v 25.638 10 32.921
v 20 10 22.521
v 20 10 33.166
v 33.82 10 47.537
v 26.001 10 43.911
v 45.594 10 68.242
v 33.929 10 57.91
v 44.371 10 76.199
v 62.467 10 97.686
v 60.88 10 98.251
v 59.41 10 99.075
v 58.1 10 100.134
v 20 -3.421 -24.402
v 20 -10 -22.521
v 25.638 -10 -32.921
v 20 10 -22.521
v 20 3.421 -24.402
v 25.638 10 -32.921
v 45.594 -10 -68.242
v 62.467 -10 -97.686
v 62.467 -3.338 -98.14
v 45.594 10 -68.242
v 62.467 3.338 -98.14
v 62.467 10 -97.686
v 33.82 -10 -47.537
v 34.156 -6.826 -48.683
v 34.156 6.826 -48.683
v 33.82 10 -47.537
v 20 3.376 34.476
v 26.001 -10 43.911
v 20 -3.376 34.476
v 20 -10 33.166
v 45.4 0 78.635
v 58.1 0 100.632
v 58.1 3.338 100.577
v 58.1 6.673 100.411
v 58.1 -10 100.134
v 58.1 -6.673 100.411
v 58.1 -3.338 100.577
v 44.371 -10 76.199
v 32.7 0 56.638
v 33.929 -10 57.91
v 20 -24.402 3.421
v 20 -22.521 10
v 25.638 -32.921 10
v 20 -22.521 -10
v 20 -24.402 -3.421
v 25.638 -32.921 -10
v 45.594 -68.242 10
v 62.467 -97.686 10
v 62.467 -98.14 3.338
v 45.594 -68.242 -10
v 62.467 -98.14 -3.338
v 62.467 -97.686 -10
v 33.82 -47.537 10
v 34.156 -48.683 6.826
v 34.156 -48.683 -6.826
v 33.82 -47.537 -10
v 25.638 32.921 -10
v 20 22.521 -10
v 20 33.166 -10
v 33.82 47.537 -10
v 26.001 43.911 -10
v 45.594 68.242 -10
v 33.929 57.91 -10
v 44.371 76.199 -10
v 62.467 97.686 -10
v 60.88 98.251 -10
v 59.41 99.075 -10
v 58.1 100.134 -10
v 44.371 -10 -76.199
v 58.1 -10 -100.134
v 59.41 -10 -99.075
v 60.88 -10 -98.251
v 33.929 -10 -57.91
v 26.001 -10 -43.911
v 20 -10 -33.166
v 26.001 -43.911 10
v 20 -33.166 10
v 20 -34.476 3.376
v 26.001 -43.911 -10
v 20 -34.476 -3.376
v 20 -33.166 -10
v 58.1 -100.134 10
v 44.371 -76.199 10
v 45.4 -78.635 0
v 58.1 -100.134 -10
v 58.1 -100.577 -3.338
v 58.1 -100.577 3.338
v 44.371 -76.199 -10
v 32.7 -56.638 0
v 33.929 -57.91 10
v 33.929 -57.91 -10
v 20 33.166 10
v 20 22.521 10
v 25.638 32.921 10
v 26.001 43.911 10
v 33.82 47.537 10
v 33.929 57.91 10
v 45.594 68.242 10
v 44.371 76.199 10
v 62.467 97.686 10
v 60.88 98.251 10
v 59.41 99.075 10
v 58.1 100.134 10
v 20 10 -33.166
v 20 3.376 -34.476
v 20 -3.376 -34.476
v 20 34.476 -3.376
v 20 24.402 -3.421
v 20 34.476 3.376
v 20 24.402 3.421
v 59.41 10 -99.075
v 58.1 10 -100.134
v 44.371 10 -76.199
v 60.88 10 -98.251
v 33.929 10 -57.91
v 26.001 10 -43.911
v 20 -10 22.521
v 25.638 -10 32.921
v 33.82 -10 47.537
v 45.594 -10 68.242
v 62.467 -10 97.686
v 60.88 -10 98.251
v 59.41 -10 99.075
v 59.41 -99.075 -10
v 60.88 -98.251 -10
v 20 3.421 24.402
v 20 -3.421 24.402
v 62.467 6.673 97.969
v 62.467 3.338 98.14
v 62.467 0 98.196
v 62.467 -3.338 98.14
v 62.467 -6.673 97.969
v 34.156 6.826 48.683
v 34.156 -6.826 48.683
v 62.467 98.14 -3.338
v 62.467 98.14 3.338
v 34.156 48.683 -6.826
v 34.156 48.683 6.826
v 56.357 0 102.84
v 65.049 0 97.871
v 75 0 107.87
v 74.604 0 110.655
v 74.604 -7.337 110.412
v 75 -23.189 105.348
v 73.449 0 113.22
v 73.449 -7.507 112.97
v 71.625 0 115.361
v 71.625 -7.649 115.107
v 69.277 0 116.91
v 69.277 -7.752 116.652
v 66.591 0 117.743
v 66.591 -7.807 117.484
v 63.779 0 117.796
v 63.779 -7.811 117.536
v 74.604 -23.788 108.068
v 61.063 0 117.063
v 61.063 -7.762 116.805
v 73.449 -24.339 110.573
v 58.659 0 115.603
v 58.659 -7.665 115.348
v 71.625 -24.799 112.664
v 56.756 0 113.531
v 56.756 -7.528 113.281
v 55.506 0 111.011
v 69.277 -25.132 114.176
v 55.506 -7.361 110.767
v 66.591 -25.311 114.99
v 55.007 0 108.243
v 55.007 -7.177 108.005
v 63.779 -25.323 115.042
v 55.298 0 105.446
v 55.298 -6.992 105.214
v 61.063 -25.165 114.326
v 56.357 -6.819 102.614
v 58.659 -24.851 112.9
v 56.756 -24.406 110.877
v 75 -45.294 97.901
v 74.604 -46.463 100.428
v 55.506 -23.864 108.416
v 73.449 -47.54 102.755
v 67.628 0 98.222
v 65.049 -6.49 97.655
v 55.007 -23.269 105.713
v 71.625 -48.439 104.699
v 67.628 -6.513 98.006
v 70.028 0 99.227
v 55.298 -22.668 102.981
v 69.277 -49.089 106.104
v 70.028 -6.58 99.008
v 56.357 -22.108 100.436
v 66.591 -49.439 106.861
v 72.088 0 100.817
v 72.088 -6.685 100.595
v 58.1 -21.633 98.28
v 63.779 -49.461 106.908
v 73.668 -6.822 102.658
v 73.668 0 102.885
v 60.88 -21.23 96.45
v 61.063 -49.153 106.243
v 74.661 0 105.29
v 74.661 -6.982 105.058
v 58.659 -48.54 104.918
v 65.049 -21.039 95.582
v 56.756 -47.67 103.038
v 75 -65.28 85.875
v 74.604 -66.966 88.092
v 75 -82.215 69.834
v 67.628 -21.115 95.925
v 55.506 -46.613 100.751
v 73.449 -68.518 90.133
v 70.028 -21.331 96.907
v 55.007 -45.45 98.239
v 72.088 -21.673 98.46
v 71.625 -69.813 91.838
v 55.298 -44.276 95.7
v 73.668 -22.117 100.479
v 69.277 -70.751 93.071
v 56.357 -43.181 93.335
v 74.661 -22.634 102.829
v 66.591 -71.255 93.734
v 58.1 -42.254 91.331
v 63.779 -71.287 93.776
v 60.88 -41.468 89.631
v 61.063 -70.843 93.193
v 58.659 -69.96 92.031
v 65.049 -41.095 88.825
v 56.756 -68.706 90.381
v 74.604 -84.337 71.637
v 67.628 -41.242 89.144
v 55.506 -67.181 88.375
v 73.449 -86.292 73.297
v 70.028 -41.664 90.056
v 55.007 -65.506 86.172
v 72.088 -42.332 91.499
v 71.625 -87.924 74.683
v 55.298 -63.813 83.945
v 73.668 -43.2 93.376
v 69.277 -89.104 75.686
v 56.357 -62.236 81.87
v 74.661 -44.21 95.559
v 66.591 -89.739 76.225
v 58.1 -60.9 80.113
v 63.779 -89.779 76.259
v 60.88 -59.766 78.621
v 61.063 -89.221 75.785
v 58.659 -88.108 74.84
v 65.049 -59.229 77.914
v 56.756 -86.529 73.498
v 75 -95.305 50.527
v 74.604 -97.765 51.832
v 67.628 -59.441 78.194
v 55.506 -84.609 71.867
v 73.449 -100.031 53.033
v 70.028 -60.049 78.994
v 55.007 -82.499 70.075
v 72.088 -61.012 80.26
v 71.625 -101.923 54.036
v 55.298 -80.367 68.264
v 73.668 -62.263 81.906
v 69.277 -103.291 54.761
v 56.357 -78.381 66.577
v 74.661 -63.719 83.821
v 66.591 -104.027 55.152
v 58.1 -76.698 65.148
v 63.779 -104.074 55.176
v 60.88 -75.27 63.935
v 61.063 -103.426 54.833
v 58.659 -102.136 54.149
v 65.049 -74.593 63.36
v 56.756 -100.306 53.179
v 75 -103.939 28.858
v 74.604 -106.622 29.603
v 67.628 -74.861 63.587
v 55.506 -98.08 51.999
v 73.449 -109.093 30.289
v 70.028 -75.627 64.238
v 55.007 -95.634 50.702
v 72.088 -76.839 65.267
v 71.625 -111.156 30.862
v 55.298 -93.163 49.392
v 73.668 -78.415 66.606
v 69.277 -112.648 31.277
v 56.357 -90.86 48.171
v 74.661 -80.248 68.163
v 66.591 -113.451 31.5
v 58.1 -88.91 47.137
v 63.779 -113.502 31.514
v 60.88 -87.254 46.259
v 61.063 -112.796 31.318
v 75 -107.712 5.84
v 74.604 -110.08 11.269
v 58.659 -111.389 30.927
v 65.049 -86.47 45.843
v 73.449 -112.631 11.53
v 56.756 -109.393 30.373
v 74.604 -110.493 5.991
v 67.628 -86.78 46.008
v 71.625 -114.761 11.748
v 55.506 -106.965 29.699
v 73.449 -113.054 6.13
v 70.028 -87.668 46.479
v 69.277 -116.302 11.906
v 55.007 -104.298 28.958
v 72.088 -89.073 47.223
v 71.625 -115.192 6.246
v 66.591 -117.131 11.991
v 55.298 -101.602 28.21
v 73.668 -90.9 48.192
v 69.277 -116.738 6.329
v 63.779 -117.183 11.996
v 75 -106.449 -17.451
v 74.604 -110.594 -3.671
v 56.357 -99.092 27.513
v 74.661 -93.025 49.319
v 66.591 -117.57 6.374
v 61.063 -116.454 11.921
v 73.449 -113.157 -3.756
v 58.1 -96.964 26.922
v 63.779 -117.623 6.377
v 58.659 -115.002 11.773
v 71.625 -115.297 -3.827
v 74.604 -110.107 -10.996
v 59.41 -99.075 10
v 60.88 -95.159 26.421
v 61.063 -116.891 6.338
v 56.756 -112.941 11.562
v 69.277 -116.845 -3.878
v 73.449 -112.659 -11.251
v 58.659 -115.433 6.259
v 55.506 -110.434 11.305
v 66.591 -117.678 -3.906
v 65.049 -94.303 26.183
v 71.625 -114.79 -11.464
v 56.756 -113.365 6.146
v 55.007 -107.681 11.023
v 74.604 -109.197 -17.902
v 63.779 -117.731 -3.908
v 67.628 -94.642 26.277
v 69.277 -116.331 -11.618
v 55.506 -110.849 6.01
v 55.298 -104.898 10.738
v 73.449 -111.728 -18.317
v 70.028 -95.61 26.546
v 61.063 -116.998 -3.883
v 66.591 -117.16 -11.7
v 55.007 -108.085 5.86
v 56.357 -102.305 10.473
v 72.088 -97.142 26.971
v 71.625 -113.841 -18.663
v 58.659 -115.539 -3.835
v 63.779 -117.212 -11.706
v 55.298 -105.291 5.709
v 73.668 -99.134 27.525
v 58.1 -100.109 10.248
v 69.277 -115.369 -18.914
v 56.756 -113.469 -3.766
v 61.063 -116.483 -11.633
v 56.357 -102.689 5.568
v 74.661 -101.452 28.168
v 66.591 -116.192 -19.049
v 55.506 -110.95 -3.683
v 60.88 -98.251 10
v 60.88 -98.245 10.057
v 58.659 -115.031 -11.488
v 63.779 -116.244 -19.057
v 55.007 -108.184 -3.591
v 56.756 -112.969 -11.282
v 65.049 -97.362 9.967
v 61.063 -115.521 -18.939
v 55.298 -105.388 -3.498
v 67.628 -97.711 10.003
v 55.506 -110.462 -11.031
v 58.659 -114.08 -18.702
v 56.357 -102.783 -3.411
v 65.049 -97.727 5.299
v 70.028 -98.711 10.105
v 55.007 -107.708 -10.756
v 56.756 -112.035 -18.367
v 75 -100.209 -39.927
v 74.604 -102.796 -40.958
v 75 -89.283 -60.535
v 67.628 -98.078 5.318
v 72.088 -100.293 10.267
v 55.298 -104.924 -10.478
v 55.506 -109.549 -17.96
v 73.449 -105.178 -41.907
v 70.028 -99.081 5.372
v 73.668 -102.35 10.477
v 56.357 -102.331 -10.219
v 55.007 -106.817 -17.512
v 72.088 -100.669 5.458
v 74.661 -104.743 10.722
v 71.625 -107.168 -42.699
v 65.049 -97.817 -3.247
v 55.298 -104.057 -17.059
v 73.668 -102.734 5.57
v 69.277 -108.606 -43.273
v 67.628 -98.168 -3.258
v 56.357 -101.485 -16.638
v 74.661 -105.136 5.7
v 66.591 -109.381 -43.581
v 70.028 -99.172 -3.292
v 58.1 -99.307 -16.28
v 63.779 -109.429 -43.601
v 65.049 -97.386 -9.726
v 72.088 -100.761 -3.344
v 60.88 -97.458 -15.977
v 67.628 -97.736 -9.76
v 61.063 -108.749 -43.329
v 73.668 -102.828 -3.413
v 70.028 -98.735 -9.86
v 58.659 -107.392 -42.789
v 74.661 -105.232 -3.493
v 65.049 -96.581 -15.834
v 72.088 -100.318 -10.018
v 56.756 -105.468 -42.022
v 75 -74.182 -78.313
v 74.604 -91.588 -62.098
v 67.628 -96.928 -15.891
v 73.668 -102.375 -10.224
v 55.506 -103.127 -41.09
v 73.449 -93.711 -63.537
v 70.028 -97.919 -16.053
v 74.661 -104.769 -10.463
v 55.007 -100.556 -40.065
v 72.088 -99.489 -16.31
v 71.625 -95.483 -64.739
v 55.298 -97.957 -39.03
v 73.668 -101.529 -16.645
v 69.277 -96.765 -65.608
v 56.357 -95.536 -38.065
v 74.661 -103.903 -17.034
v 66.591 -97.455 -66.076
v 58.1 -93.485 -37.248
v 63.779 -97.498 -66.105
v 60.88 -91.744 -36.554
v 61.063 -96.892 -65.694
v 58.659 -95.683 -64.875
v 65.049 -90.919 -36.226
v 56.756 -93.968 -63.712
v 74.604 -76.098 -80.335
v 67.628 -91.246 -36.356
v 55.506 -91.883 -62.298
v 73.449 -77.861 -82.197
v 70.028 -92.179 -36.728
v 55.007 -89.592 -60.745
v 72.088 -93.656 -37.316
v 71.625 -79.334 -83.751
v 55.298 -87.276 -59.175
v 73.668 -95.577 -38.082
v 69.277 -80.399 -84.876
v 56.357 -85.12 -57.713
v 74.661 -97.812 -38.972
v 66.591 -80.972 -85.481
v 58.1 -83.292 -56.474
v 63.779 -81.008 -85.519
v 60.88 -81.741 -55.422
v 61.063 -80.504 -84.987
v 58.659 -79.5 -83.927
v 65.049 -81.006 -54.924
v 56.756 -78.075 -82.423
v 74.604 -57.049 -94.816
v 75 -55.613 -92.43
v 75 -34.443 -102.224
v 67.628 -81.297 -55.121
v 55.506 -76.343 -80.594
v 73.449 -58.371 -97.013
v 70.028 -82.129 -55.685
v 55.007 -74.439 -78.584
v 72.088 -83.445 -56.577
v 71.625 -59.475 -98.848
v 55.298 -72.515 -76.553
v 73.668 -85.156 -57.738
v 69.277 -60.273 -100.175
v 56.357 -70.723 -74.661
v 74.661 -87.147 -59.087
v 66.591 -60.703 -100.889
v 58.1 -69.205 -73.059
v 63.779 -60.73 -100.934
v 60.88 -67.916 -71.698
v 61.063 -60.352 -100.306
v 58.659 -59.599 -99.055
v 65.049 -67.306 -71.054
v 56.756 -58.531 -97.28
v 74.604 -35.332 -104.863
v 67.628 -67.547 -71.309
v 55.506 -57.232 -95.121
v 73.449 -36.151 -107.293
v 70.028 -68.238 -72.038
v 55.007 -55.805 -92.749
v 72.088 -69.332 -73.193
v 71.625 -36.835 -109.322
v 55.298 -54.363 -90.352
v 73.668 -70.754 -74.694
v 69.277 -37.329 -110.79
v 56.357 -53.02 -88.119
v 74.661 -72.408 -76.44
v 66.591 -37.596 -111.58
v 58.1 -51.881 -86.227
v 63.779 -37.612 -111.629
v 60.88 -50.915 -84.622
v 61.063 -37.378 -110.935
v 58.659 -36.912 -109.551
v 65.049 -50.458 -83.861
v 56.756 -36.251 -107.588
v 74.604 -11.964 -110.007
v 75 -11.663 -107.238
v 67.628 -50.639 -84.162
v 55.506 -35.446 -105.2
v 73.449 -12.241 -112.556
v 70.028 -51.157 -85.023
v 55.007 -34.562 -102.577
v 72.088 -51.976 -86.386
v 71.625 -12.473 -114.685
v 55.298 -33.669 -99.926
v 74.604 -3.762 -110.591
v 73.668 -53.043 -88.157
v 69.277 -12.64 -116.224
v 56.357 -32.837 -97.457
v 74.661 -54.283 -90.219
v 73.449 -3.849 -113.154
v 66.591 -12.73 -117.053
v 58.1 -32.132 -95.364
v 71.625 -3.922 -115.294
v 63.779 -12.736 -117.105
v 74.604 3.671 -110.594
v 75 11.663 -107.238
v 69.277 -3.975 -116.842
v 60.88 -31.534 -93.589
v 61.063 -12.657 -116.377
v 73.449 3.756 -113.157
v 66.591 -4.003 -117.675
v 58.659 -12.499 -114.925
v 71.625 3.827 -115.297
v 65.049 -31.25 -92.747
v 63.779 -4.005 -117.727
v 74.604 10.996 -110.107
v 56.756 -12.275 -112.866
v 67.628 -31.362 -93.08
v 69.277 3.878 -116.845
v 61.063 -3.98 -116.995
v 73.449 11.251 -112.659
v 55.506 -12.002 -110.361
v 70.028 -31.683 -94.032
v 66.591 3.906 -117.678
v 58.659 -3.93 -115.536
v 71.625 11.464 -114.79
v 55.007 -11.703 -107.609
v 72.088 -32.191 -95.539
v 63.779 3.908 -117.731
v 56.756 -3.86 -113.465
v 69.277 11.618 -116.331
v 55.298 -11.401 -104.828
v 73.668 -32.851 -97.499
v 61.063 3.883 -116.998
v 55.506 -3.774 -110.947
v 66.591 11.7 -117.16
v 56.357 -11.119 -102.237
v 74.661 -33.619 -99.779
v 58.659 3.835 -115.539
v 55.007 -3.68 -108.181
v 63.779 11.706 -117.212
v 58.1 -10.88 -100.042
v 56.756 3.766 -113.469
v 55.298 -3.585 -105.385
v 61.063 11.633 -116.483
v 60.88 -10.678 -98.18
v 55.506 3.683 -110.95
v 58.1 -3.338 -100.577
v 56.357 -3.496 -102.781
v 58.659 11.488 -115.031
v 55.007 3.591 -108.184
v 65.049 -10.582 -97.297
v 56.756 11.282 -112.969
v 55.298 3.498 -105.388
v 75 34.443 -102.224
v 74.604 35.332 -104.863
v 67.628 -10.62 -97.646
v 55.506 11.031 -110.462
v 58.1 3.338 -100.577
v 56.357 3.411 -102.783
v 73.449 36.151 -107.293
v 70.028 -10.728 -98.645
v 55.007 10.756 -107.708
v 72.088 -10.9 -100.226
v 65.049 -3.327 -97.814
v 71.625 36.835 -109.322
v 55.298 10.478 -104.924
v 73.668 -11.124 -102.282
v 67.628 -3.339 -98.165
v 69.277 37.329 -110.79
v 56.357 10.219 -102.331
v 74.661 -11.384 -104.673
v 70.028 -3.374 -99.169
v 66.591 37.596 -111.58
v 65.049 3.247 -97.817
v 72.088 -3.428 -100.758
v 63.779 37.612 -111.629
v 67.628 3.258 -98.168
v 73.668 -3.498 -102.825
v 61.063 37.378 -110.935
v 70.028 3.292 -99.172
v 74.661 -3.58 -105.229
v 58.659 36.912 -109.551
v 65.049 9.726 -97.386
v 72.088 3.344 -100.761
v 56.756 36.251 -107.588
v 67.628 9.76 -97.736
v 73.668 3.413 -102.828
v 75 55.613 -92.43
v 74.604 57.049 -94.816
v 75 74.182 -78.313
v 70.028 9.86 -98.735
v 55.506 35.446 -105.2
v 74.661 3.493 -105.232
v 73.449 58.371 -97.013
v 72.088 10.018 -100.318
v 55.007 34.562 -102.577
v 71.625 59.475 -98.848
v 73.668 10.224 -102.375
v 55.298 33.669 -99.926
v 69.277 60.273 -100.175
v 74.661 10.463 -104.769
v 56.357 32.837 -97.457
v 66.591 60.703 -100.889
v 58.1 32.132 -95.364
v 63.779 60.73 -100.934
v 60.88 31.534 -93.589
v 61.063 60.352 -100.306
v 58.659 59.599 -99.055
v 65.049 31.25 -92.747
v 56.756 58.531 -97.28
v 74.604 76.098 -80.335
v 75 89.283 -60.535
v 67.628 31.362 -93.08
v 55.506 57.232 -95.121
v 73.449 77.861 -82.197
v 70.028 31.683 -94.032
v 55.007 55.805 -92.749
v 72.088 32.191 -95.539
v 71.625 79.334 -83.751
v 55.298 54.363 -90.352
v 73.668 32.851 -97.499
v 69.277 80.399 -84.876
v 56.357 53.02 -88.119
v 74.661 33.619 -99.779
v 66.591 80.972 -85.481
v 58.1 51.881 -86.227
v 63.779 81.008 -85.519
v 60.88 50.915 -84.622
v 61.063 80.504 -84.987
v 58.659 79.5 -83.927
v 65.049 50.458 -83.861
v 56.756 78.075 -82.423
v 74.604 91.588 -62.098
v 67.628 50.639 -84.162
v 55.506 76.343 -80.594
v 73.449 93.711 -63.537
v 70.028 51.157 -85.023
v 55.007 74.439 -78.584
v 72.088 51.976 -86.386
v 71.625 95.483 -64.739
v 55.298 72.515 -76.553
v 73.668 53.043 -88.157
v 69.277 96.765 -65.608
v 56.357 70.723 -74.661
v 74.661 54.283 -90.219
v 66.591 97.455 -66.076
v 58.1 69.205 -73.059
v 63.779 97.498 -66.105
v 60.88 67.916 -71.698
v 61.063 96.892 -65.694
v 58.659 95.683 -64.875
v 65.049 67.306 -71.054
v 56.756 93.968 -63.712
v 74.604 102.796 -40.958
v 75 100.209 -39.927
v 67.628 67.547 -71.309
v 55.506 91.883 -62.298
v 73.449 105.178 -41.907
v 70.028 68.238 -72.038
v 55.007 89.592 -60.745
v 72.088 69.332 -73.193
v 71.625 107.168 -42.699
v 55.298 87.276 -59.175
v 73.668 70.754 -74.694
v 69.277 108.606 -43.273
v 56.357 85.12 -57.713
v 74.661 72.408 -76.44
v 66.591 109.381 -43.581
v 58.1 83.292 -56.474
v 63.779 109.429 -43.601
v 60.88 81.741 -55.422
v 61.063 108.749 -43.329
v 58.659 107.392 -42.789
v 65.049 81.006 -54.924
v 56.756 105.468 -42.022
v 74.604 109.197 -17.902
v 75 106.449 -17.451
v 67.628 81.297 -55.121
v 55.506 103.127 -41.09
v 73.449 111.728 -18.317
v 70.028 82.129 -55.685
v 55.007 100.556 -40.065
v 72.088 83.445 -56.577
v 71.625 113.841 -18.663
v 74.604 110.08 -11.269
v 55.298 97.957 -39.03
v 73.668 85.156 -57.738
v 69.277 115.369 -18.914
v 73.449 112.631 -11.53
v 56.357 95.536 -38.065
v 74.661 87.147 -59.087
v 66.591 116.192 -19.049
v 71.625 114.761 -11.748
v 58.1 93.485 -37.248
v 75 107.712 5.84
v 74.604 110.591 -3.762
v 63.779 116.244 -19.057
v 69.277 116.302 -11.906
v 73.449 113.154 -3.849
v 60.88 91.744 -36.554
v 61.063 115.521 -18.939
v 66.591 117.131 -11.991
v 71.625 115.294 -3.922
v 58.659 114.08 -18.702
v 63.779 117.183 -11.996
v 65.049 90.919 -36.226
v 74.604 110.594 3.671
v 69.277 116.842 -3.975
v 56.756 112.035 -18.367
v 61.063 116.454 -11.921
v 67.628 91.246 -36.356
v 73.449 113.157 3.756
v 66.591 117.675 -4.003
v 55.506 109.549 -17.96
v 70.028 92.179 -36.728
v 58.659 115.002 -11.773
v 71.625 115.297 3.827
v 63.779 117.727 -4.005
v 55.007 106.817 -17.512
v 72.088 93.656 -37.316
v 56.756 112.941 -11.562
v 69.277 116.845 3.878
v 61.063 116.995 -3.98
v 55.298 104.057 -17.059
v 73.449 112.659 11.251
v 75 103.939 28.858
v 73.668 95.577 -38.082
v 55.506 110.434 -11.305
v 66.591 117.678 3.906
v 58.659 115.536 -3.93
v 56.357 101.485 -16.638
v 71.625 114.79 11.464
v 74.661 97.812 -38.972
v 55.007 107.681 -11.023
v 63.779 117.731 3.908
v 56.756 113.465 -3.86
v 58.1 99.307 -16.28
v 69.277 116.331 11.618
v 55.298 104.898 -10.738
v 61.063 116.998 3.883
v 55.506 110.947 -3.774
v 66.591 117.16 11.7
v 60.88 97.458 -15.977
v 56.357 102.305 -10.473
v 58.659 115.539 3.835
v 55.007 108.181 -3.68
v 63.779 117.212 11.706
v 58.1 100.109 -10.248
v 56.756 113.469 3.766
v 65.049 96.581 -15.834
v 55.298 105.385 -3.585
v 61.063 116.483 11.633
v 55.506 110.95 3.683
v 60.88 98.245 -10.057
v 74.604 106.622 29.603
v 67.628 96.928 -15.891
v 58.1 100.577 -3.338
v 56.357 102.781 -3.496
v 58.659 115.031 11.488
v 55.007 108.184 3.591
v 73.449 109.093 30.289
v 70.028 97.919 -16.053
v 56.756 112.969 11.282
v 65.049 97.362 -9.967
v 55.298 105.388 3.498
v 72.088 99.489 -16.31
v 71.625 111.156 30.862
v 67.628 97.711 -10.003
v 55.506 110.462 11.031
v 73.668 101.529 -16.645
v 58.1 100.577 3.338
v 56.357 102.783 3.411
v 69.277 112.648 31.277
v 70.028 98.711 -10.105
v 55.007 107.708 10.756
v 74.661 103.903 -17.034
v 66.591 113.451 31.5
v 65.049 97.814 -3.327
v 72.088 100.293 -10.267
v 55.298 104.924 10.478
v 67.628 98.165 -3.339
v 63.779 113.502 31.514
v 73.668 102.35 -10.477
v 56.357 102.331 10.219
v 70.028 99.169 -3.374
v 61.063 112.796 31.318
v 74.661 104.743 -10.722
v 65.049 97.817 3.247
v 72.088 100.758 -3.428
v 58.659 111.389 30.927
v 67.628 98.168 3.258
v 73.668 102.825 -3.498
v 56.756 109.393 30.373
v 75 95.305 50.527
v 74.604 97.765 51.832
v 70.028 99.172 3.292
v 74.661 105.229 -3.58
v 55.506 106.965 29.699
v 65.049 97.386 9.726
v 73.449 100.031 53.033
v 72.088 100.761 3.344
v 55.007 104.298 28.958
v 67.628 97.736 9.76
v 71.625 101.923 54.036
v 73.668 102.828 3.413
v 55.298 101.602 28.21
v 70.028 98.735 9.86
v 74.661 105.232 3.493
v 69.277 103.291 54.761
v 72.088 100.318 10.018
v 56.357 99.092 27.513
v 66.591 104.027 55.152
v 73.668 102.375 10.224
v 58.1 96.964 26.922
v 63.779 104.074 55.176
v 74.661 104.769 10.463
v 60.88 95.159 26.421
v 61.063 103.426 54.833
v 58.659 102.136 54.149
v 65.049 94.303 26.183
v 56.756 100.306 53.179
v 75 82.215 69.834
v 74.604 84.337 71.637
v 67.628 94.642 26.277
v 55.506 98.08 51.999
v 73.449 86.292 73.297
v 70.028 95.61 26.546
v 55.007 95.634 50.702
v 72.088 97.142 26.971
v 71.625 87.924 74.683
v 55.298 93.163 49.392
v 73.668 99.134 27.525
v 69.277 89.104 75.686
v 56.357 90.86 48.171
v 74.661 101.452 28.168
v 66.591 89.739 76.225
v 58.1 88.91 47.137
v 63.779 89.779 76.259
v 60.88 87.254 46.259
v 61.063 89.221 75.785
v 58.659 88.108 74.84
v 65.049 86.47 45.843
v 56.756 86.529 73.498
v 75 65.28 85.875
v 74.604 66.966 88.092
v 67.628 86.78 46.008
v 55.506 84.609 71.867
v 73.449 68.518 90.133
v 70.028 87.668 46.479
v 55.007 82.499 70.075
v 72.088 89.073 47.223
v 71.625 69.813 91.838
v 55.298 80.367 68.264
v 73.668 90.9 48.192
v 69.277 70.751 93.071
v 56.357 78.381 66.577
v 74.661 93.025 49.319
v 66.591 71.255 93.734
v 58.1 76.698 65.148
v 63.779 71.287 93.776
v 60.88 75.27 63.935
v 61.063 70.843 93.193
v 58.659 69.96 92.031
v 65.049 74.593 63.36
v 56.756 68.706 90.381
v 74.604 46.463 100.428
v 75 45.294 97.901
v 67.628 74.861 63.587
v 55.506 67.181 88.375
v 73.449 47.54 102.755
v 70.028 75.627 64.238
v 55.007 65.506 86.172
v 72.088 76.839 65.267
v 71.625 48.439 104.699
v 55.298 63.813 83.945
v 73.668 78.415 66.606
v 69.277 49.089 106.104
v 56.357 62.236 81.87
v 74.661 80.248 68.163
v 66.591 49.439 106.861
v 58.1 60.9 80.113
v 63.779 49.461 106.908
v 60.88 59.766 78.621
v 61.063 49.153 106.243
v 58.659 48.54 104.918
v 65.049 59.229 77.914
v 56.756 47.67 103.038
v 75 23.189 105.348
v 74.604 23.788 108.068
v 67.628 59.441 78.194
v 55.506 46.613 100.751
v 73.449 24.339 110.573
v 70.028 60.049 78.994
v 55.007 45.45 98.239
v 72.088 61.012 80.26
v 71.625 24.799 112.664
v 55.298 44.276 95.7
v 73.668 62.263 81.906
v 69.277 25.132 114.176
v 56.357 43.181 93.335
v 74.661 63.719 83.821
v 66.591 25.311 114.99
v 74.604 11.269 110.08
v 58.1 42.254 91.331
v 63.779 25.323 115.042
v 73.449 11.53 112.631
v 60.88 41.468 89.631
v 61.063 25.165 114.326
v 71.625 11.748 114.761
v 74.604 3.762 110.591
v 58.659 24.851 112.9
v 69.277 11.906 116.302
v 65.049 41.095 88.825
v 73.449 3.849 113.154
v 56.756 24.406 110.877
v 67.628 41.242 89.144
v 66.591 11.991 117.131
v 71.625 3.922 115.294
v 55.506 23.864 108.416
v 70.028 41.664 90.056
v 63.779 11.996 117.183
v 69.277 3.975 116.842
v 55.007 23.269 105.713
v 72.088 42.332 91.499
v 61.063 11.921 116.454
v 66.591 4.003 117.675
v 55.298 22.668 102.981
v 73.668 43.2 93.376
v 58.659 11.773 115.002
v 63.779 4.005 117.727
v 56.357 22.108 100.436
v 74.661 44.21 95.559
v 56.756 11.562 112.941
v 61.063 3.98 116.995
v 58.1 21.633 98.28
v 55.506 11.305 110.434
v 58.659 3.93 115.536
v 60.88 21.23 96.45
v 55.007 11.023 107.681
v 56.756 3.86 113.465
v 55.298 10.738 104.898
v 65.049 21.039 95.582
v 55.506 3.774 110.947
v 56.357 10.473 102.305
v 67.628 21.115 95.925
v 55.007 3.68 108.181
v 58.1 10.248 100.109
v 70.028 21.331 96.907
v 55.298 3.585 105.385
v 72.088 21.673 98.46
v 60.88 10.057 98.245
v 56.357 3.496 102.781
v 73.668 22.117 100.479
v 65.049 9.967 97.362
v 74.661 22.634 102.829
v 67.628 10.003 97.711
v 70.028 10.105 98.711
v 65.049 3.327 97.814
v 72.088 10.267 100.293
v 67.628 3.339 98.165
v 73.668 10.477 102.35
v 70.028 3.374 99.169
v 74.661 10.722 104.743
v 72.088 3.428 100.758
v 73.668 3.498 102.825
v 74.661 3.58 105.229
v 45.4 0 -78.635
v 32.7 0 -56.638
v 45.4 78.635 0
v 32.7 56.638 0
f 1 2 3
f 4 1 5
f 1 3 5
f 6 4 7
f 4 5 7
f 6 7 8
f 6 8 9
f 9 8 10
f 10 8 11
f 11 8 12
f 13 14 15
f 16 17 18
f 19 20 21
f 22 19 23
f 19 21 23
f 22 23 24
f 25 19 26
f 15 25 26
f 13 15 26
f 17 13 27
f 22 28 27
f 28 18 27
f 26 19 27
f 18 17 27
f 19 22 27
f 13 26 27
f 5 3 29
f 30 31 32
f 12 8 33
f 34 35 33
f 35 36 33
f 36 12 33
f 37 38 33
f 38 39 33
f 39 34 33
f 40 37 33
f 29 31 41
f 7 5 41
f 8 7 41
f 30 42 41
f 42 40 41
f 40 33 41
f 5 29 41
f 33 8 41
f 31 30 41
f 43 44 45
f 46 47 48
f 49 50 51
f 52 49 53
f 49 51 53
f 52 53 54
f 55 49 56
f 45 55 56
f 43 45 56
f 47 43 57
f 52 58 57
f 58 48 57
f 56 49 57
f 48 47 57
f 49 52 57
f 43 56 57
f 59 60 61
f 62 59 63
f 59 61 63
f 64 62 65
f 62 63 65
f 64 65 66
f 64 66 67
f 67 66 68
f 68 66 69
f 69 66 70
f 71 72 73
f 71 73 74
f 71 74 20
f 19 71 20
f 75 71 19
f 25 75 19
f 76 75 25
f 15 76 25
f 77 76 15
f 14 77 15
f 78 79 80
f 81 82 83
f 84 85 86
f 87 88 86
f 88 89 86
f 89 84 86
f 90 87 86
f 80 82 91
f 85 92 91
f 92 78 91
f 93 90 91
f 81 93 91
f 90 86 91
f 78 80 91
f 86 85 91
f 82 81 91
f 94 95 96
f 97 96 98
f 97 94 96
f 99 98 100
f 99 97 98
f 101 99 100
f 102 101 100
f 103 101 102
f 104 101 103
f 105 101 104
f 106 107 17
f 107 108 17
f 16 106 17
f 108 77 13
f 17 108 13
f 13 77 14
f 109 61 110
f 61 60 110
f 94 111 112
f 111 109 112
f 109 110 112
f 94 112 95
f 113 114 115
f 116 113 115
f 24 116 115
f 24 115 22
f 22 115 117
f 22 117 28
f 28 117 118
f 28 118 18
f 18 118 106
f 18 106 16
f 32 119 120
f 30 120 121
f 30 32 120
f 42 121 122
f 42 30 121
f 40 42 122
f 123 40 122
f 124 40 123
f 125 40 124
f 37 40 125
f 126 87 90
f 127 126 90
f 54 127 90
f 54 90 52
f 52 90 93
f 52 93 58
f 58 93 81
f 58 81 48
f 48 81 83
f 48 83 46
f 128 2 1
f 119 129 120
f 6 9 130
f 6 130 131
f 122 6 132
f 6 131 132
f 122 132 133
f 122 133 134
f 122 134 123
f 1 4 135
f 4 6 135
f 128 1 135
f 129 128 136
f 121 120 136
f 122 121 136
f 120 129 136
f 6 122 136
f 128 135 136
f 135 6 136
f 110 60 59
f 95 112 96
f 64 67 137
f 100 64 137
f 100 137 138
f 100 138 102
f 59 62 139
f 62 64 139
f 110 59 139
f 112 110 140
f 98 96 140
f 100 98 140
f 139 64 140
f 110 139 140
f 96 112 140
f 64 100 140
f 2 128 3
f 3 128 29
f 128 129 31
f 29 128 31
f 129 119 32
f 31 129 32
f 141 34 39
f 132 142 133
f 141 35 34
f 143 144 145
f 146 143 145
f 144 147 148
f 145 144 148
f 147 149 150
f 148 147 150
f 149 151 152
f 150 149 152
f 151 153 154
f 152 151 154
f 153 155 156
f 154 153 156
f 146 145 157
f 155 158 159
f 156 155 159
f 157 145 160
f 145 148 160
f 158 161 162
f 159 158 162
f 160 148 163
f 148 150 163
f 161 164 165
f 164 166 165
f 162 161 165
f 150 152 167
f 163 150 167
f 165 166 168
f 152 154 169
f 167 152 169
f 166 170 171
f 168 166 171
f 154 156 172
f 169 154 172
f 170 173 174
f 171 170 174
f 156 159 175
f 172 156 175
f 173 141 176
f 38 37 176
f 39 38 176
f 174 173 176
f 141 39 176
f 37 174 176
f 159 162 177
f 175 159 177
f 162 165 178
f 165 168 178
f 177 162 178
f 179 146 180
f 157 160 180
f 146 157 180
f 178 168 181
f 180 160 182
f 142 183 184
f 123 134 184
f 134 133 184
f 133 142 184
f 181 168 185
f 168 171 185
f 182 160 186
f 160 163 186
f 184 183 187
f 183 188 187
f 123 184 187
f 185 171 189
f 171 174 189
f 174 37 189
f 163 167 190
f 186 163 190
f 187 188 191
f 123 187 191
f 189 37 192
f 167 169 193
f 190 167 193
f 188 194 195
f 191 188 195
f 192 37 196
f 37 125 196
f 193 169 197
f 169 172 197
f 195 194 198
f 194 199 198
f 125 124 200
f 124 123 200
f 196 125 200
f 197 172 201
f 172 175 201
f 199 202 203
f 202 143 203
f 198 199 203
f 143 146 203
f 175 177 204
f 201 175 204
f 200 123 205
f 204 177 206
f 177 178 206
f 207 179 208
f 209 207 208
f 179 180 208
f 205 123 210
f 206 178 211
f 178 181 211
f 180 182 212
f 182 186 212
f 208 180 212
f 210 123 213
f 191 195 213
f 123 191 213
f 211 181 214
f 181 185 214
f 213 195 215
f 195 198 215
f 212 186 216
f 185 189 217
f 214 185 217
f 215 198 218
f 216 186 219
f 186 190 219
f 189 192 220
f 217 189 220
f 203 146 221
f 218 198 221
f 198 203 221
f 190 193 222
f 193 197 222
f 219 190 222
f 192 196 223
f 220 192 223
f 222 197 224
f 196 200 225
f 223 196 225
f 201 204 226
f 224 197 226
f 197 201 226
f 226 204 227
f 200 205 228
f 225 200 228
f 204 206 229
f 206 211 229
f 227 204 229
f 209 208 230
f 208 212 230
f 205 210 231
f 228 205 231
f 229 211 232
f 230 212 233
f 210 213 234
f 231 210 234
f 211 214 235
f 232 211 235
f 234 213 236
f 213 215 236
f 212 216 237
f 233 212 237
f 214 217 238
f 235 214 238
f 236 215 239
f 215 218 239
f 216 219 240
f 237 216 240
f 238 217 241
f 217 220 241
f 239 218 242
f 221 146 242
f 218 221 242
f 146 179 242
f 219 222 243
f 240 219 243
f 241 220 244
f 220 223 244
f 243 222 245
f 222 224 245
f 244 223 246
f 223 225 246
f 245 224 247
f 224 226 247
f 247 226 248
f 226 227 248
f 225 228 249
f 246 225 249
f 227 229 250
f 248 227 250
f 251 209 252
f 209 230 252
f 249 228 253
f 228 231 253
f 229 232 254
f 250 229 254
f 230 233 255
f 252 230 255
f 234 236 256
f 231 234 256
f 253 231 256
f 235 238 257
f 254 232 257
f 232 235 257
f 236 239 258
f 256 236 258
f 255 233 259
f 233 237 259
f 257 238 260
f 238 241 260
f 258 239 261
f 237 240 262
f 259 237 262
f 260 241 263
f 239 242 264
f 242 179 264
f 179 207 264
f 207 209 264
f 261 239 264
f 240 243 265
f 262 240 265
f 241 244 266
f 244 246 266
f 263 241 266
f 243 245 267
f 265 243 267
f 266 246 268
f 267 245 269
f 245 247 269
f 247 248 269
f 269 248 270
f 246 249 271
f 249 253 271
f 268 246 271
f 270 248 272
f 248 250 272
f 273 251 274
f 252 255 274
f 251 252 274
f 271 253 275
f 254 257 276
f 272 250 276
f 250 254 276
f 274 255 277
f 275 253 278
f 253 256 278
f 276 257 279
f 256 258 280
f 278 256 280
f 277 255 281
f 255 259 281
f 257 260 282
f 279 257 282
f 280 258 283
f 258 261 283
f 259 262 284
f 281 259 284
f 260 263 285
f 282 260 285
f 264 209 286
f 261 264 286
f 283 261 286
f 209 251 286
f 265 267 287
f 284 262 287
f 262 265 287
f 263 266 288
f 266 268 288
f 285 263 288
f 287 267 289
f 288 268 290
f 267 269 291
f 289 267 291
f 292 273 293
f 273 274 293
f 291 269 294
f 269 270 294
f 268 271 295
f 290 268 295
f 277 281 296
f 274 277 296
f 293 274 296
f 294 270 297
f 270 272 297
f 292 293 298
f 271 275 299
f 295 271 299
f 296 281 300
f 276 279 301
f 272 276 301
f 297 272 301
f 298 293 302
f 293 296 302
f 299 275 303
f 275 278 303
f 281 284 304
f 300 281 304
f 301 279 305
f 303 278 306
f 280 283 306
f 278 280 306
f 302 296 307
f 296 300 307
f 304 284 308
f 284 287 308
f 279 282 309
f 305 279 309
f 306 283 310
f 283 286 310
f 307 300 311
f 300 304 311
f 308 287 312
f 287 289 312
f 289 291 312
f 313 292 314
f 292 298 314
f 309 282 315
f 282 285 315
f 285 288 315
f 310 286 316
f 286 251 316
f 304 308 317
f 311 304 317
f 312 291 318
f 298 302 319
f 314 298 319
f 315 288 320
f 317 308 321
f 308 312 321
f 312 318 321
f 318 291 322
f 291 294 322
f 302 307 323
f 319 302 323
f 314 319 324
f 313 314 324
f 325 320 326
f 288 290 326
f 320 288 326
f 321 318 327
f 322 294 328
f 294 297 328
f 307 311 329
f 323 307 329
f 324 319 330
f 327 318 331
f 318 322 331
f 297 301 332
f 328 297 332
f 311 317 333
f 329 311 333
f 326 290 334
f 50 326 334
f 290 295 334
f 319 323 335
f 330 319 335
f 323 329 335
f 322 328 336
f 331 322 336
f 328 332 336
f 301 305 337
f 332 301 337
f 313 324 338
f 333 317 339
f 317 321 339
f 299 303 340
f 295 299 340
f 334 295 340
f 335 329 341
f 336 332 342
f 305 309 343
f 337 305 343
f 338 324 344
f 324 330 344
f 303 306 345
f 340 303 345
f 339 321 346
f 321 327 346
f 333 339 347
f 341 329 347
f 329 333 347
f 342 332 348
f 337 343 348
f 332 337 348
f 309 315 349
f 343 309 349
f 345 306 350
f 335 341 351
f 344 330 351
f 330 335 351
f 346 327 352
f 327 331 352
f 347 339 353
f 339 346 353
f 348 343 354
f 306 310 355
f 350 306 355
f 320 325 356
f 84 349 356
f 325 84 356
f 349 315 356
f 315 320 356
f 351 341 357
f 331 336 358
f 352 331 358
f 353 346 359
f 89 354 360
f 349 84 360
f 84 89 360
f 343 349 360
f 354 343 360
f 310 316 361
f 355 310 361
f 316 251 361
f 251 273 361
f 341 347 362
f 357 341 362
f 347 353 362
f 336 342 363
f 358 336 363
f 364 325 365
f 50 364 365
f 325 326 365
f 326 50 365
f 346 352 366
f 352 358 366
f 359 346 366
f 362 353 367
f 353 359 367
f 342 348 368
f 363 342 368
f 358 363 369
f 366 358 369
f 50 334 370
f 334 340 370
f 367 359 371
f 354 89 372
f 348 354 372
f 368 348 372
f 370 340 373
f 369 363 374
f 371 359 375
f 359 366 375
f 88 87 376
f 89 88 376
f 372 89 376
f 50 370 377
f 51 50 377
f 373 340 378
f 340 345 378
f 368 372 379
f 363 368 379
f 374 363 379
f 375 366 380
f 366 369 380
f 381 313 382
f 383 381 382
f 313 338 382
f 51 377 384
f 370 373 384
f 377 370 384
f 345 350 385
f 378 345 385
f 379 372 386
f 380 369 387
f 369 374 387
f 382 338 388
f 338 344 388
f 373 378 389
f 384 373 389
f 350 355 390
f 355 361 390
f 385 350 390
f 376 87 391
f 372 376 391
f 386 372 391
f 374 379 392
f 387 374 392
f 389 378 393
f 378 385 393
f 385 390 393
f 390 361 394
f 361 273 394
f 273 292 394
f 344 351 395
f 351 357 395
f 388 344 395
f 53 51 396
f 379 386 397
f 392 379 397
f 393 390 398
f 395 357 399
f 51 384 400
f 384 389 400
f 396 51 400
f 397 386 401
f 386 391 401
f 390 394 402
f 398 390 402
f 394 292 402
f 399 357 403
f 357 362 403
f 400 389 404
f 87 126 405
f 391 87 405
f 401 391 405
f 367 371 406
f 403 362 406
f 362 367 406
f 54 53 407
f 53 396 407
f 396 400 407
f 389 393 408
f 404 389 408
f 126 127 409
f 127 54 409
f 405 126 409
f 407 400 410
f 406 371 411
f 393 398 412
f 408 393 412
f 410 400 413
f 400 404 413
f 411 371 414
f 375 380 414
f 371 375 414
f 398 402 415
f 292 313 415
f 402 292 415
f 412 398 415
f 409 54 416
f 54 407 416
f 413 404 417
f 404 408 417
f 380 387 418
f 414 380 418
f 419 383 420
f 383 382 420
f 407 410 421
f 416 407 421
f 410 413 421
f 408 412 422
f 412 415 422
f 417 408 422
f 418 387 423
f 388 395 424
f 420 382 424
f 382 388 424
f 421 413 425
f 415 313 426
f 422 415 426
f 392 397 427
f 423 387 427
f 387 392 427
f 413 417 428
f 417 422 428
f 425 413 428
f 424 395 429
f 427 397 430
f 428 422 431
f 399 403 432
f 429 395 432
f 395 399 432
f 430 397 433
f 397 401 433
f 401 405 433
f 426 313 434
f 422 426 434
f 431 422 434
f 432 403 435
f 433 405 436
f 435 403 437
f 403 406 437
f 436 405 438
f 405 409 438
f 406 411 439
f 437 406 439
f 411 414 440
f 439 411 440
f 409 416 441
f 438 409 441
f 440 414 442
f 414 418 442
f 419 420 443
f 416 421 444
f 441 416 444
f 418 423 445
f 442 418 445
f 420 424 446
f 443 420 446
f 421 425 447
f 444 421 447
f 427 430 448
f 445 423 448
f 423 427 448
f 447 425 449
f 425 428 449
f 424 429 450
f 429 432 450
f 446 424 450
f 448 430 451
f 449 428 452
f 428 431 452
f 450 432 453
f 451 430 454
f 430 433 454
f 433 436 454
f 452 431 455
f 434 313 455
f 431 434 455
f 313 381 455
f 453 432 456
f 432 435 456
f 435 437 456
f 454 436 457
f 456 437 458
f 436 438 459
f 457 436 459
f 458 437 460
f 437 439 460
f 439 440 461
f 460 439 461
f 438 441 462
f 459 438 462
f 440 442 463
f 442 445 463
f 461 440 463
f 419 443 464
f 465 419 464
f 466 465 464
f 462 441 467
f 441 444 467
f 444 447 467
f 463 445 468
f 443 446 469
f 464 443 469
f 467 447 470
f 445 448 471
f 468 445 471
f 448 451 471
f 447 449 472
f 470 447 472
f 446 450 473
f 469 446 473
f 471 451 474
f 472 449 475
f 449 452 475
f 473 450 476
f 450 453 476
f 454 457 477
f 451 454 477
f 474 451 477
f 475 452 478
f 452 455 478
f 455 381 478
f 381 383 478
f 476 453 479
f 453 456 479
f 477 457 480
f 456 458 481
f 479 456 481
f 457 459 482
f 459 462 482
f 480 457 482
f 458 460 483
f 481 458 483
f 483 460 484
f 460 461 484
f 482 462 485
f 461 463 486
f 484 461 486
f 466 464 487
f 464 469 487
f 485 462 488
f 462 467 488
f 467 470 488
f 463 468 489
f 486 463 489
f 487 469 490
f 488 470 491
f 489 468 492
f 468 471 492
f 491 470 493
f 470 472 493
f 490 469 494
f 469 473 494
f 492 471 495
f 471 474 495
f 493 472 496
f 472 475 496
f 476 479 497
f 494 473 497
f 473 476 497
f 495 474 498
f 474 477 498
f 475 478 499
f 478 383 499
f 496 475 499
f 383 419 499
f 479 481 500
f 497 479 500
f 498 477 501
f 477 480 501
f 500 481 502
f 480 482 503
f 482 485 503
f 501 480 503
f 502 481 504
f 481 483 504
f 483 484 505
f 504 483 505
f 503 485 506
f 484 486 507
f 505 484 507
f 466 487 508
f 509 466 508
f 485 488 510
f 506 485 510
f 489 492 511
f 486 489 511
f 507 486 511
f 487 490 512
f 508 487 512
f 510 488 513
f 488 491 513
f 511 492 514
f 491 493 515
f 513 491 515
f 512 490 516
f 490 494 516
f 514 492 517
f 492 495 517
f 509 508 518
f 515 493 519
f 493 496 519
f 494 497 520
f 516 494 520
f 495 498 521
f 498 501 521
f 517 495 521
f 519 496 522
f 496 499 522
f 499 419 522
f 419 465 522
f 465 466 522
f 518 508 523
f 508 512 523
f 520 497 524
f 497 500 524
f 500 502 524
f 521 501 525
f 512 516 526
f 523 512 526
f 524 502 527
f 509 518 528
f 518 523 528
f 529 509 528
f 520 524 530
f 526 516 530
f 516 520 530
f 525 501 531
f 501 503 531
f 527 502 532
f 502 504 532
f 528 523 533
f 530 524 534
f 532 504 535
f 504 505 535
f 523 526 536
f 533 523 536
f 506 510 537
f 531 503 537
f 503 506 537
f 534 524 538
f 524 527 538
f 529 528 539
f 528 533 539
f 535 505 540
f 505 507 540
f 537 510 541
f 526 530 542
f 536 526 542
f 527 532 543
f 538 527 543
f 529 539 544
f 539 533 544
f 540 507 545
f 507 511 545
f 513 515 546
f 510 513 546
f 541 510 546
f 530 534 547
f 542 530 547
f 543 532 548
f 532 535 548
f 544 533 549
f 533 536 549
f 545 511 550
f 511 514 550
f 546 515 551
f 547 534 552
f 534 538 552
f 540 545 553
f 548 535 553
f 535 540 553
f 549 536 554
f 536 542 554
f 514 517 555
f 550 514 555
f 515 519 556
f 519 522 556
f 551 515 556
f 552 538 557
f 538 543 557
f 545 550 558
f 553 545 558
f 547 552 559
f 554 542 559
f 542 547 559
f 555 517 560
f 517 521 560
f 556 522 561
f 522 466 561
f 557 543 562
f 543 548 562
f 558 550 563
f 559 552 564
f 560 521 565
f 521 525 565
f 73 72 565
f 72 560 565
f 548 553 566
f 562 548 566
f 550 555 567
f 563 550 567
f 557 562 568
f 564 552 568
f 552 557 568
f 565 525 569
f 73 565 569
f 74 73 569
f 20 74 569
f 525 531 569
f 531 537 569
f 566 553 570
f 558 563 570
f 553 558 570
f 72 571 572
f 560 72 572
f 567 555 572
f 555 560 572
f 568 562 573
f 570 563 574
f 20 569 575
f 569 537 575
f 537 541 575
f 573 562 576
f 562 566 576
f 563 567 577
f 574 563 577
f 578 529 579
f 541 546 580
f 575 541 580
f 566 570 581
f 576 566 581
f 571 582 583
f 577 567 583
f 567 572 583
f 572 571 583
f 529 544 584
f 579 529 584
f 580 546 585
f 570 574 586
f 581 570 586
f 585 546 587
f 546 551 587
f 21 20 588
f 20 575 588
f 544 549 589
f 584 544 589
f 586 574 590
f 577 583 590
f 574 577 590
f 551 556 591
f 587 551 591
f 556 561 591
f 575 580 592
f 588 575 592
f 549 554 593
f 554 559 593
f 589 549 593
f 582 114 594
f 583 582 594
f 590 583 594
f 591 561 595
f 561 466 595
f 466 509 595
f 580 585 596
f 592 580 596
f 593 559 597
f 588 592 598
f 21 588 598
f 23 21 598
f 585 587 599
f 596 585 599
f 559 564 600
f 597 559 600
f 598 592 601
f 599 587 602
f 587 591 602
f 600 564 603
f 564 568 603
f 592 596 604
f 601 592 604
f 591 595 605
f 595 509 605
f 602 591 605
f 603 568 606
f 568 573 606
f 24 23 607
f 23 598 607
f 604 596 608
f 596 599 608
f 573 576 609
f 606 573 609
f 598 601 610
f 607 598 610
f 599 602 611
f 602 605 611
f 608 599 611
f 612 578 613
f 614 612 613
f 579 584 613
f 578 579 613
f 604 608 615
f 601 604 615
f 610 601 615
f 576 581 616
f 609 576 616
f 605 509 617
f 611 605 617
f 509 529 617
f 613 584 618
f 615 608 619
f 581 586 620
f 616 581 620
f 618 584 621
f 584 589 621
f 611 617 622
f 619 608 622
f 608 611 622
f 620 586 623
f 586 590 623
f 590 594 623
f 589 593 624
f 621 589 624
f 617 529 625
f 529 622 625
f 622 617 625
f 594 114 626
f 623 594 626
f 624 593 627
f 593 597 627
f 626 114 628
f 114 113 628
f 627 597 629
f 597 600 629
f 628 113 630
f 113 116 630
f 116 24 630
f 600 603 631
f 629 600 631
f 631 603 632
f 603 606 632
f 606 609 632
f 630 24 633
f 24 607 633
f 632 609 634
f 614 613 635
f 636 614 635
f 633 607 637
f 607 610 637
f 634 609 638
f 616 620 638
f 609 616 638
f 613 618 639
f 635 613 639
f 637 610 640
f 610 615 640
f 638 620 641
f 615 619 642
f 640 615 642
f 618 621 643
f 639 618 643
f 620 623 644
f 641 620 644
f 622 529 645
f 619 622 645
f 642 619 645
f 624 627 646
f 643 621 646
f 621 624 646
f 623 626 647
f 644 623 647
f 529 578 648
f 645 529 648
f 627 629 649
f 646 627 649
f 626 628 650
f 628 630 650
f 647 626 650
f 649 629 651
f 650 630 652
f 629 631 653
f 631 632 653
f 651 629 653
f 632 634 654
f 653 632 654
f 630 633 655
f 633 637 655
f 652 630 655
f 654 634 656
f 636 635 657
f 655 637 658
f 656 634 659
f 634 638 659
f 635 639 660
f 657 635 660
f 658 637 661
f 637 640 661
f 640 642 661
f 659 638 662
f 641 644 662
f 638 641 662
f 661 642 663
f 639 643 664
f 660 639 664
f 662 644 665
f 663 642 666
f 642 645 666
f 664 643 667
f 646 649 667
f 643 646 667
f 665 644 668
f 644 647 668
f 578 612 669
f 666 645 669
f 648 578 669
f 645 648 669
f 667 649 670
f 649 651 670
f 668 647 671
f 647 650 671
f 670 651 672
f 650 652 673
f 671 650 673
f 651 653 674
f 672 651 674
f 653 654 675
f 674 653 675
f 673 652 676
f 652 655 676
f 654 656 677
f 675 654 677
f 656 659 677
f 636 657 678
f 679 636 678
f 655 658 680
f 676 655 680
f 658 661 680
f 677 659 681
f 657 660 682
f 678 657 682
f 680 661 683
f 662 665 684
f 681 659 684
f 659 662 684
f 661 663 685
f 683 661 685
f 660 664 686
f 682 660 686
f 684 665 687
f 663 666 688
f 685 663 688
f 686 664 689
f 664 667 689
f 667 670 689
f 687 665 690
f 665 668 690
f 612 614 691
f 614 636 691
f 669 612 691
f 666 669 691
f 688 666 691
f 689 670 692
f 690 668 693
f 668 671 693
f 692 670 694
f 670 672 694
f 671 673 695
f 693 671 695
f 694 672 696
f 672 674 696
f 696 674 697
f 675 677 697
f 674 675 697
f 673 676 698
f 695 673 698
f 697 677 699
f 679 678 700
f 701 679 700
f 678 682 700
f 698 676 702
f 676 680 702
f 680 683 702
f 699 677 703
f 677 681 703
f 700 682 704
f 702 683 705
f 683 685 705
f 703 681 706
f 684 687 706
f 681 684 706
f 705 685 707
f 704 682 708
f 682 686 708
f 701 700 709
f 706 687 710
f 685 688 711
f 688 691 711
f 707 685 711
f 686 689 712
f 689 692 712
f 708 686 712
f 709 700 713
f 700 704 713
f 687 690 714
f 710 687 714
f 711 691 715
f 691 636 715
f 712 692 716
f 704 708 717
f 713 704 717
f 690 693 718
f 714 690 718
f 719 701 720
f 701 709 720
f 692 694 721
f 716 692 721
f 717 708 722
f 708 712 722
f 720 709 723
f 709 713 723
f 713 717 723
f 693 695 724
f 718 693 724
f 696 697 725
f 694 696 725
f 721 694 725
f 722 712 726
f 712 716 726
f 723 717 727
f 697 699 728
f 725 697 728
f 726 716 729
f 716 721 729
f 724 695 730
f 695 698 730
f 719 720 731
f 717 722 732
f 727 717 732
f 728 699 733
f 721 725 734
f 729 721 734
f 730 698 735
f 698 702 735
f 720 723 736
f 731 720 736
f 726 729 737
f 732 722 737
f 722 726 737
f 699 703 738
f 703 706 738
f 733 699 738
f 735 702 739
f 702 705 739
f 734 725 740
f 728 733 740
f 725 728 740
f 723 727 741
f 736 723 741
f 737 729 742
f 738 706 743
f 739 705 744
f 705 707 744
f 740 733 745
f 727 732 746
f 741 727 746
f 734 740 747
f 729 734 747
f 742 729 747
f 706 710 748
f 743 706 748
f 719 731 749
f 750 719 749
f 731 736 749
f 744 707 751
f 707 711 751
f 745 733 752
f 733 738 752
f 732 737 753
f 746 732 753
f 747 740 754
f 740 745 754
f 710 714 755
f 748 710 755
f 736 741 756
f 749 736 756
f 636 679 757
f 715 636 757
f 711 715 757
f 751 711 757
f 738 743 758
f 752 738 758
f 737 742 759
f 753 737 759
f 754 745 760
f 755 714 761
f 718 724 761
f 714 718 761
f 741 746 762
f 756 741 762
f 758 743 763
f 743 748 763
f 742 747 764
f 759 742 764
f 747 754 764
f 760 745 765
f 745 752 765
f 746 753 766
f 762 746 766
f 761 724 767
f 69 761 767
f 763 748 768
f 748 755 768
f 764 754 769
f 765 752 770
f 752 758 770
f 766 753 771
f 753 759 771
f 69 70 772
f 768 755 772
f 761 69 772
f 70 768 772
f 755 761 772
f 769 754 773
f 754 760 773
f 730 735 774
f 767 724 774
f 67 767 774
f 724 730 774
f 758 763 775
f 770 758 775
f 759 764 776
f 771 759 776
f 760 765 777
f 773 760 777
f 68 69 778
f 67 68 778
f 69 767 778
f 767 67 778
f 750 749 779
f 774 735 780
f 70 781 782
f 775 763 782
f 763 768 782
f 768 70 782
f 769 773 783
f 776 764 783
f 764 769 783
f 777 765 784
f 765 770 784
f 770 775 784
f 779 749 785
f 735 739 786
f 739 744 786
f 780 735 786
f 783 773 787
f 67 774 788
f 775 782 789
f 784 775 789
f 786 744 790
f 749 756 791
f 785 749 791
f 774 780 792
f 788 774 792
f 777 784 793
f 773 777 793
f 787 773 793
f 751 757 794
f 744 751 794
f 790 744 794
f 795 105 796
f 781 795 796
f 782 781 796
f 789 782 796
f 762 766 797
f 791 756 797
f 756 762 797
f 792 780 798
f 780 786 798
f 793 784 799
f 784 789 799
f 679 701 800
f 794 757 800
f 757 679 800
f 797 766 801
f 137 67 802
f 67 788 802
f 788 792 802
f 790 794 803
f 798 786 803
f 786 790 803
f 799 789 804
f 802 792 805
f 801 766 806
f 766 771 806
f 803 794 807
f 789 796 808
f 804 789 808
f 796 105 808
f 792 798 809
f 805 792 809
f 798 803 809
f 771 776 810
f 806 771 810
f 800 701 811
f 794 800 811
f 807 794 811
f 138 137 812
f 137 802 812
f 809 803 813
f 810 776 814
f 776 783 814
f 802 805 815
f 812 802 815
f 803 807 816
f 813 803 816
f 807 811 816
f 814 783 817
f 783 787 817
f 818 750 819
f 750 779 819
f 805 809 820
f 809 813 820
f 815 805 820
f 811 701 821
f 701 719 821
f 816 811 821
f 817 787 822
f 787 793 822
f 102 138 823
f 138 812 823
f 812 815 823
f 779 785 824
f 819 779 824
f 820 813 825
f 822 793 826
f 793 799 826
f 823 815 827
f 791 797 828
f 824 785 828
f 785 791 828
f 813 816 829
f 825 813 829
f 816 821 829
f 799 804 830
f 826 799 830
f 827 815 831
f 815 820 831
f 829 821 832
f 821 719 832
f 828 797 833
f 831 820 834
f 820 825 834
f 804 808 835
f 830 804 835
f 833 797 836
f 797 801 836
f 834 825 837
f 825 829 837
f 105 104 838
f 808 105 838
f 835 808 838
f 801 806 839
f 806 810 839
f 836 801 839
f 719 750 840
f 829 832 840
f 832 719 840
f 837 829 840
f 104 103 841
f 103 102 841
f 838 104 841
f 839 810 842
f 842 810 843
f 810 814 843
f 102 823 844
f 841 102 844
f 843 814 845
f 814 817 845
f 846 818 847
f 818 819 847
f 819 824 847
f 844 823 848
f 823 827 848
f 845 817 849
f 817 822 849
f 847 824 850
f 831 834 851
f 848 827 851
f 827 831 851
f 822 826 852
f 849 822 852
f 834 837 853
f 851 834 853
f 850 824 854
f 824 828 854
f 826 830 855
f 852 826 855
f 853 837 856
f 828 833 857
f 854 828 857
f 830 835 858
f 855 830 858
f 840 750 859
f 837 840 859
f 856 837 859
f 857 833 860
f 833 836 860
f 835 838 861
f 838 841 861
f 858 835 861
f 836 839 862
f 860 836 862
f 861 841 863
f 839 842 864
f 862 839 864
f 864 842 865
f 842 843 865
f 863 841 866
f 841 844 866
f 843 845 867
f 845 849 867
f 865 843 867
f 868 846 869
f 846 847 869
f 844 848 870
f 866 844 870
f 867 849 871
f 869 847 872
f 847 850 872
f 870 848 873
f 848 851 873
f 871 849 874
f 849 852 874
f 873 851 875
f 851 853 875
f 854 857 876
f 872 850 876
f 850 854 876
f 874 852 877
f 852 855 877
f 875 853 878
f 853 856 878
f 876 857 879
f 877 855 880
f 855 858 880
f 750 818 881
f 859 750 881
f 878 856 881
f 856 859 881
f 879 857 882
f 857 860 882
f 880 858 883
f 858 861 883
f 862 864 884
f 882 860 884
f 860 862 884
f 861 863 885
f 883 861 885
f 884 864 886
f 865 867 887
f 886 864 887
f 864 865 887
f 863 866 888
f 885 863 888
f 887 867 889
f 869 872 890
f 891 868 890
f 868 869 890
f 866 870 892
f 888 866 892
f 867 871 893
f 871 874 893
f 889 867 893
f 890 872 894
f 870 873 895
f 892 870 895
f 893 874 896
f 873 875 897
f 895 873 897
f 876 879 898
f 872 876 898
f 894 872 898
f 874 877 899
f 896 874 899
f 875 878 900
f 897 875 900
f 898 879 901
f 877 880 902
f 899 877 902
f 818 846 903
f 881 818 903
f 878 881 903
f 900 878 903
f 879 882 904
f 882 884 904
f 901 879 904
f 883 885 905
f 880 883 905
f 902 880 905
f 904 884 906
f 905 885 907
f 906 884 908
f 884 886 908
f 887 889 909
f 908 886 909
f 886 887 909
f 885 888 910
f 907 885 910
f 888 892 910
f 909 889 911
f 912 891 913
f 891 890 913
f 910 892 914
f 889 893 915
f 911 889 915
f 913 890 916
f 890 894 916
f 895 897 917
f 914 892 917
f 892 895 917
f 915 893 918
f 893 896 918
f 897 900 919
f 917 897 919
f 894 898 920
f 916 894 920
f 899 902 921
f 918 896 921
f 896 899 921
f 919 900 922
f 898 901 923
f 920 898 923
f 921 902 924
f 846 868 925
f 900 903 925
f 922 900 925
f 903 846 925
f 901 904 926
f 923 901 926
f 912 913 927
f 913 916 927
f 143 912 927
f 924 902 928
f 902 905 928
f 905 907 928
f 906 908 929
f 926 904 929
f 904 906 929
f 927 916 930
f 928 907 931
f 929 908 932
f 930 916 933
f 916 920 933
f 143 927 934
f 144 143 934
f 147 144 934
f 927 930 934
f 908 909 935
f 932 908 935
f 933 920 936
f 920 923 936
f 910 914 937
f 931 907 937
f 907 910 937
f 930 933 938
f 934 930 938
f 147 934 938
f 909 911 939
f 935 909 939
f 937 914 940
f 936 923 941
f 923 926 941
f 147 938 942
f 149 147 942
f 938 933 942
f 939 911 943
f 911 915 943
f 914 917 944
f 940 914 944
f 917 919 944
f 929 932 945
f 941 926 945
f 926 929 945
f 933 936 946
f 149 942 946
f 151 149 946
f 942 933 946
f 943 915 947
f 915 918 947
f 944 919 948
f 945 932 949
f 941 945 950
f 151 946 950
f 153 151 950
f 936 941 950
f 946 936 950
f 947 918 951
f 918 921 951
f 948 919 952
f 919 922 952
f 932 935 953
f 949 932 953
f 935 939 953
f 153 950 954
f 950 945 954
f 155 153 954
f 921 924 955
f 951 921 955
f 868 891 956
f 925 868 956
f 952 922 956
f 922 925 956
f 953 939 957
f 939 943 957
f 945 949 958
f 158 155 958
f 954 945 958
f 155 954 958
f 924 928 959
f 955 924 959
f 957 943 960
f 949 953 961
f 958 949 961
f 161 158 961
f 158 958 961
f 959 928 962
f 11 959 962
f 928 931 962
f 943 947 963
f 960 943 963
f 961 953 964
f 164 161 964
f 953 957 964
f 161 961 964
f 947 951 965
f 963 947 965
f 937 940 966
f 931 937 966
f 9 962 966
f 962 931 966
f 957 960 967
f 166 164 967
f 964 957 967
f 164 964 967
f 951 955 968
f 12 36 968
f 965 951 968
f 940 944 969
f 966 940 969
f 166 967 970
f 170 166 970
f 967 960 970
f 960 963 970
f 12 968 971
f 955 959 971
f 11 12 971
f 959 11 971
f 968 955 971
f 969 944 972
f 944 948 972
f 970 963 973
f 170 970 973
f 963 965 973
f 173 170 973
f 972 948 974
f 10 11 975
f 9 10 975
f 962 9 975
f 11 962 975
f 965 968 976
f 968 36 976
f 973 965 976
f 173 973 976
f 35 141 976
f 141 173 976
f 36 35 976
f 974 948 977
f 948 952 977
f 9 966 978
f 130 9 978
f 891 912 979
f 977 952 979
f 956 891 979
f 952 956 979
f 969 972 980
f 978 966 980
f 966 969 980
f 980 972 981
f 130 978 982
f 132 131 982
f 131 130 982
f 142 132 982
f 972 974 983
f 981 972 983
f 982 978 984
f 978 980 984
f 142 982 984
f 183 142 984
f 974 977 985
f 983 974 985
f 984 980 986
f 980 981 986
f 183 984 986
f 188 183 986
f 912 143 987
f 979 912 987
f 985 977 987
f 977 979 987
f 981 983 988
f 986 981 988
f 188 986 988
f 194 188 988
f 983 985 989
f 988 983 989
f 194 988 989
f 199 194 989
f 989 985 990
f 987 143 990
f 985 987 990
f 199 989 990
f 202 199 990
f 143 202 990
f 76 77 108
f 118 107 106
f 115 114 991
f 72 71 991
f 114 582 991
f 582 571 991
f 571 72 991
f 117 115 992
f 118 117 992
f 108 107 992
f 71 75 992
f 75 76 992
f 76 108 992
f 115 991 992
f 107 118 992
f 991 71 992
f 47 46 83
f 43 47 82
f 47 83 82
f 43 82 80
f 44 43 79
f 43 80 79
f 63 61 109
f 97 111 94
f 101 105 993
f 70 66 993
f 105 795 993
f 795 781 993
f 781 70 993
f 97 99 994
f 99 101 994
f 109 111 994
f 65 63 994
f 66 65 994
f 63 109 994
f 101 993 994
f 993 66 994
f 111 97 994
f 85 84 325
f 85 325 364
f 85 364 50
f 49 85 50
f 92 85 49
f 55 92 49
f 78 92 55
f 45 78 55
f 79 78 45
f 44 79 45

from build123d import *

# Parameters (mm, degrees)
F2_W     = 100
F2_H     = 100
F3_DEPTH = 100
F4_R     = 10
F6_W     = 96.7741915935
F6_H     = 197.4193443438
F7_DEPTH = 50


with BuildPart() as f1:
    # F0 (on Front) → F1 (revolve)
    with BuildSketch(Plane.XZ):
        Polygon((59.1784025919, 102.5), (0, 0), (5.7735026919, 0), (63.5085296109, 100), align=None)
    revolve(axis=Axis((20.5558100715, 0, 0), (1, 0, 0)))

    # F2 (on Right) → F3 (cut)
    with BuildSketch(Plane.YZ):
        with Locations((60, 60)):
            Rectangle(F2_W, F2_H)
        with Locations((60, -60)):
            Rectangle(F2_W, F2_H)
        with Locations((-60, 60)):
            Rectangle(F2_W, F2_H)
        with Locations((-60, -60)):
            Rectangle(F2_W, F2_H)
    extrude(amount=F3_DEPTH, mode=Mode.SUBTRACT)

    # F4 (on Front) → F5 (revolve)
    with BuildSketch(Plane.XZ):
        with Locations((65, 107.8704196738)):
            Circle(F4_R)
    revolve(axis=Axis((29.1963377967, 0, 0), (1, 0, 0)))

    # F6 (on Front) → F7 (cut, symmetric)
    with BuildSketch(Plane.XZ):
        with Locations((-28.3870957967, -5.0861872733)):
            Rectangle(F6_W, F6_H)
    extrude(amount=F7_DEPTH, both=True, mode=Mode.SUBTRACT)


solid = f1.part
